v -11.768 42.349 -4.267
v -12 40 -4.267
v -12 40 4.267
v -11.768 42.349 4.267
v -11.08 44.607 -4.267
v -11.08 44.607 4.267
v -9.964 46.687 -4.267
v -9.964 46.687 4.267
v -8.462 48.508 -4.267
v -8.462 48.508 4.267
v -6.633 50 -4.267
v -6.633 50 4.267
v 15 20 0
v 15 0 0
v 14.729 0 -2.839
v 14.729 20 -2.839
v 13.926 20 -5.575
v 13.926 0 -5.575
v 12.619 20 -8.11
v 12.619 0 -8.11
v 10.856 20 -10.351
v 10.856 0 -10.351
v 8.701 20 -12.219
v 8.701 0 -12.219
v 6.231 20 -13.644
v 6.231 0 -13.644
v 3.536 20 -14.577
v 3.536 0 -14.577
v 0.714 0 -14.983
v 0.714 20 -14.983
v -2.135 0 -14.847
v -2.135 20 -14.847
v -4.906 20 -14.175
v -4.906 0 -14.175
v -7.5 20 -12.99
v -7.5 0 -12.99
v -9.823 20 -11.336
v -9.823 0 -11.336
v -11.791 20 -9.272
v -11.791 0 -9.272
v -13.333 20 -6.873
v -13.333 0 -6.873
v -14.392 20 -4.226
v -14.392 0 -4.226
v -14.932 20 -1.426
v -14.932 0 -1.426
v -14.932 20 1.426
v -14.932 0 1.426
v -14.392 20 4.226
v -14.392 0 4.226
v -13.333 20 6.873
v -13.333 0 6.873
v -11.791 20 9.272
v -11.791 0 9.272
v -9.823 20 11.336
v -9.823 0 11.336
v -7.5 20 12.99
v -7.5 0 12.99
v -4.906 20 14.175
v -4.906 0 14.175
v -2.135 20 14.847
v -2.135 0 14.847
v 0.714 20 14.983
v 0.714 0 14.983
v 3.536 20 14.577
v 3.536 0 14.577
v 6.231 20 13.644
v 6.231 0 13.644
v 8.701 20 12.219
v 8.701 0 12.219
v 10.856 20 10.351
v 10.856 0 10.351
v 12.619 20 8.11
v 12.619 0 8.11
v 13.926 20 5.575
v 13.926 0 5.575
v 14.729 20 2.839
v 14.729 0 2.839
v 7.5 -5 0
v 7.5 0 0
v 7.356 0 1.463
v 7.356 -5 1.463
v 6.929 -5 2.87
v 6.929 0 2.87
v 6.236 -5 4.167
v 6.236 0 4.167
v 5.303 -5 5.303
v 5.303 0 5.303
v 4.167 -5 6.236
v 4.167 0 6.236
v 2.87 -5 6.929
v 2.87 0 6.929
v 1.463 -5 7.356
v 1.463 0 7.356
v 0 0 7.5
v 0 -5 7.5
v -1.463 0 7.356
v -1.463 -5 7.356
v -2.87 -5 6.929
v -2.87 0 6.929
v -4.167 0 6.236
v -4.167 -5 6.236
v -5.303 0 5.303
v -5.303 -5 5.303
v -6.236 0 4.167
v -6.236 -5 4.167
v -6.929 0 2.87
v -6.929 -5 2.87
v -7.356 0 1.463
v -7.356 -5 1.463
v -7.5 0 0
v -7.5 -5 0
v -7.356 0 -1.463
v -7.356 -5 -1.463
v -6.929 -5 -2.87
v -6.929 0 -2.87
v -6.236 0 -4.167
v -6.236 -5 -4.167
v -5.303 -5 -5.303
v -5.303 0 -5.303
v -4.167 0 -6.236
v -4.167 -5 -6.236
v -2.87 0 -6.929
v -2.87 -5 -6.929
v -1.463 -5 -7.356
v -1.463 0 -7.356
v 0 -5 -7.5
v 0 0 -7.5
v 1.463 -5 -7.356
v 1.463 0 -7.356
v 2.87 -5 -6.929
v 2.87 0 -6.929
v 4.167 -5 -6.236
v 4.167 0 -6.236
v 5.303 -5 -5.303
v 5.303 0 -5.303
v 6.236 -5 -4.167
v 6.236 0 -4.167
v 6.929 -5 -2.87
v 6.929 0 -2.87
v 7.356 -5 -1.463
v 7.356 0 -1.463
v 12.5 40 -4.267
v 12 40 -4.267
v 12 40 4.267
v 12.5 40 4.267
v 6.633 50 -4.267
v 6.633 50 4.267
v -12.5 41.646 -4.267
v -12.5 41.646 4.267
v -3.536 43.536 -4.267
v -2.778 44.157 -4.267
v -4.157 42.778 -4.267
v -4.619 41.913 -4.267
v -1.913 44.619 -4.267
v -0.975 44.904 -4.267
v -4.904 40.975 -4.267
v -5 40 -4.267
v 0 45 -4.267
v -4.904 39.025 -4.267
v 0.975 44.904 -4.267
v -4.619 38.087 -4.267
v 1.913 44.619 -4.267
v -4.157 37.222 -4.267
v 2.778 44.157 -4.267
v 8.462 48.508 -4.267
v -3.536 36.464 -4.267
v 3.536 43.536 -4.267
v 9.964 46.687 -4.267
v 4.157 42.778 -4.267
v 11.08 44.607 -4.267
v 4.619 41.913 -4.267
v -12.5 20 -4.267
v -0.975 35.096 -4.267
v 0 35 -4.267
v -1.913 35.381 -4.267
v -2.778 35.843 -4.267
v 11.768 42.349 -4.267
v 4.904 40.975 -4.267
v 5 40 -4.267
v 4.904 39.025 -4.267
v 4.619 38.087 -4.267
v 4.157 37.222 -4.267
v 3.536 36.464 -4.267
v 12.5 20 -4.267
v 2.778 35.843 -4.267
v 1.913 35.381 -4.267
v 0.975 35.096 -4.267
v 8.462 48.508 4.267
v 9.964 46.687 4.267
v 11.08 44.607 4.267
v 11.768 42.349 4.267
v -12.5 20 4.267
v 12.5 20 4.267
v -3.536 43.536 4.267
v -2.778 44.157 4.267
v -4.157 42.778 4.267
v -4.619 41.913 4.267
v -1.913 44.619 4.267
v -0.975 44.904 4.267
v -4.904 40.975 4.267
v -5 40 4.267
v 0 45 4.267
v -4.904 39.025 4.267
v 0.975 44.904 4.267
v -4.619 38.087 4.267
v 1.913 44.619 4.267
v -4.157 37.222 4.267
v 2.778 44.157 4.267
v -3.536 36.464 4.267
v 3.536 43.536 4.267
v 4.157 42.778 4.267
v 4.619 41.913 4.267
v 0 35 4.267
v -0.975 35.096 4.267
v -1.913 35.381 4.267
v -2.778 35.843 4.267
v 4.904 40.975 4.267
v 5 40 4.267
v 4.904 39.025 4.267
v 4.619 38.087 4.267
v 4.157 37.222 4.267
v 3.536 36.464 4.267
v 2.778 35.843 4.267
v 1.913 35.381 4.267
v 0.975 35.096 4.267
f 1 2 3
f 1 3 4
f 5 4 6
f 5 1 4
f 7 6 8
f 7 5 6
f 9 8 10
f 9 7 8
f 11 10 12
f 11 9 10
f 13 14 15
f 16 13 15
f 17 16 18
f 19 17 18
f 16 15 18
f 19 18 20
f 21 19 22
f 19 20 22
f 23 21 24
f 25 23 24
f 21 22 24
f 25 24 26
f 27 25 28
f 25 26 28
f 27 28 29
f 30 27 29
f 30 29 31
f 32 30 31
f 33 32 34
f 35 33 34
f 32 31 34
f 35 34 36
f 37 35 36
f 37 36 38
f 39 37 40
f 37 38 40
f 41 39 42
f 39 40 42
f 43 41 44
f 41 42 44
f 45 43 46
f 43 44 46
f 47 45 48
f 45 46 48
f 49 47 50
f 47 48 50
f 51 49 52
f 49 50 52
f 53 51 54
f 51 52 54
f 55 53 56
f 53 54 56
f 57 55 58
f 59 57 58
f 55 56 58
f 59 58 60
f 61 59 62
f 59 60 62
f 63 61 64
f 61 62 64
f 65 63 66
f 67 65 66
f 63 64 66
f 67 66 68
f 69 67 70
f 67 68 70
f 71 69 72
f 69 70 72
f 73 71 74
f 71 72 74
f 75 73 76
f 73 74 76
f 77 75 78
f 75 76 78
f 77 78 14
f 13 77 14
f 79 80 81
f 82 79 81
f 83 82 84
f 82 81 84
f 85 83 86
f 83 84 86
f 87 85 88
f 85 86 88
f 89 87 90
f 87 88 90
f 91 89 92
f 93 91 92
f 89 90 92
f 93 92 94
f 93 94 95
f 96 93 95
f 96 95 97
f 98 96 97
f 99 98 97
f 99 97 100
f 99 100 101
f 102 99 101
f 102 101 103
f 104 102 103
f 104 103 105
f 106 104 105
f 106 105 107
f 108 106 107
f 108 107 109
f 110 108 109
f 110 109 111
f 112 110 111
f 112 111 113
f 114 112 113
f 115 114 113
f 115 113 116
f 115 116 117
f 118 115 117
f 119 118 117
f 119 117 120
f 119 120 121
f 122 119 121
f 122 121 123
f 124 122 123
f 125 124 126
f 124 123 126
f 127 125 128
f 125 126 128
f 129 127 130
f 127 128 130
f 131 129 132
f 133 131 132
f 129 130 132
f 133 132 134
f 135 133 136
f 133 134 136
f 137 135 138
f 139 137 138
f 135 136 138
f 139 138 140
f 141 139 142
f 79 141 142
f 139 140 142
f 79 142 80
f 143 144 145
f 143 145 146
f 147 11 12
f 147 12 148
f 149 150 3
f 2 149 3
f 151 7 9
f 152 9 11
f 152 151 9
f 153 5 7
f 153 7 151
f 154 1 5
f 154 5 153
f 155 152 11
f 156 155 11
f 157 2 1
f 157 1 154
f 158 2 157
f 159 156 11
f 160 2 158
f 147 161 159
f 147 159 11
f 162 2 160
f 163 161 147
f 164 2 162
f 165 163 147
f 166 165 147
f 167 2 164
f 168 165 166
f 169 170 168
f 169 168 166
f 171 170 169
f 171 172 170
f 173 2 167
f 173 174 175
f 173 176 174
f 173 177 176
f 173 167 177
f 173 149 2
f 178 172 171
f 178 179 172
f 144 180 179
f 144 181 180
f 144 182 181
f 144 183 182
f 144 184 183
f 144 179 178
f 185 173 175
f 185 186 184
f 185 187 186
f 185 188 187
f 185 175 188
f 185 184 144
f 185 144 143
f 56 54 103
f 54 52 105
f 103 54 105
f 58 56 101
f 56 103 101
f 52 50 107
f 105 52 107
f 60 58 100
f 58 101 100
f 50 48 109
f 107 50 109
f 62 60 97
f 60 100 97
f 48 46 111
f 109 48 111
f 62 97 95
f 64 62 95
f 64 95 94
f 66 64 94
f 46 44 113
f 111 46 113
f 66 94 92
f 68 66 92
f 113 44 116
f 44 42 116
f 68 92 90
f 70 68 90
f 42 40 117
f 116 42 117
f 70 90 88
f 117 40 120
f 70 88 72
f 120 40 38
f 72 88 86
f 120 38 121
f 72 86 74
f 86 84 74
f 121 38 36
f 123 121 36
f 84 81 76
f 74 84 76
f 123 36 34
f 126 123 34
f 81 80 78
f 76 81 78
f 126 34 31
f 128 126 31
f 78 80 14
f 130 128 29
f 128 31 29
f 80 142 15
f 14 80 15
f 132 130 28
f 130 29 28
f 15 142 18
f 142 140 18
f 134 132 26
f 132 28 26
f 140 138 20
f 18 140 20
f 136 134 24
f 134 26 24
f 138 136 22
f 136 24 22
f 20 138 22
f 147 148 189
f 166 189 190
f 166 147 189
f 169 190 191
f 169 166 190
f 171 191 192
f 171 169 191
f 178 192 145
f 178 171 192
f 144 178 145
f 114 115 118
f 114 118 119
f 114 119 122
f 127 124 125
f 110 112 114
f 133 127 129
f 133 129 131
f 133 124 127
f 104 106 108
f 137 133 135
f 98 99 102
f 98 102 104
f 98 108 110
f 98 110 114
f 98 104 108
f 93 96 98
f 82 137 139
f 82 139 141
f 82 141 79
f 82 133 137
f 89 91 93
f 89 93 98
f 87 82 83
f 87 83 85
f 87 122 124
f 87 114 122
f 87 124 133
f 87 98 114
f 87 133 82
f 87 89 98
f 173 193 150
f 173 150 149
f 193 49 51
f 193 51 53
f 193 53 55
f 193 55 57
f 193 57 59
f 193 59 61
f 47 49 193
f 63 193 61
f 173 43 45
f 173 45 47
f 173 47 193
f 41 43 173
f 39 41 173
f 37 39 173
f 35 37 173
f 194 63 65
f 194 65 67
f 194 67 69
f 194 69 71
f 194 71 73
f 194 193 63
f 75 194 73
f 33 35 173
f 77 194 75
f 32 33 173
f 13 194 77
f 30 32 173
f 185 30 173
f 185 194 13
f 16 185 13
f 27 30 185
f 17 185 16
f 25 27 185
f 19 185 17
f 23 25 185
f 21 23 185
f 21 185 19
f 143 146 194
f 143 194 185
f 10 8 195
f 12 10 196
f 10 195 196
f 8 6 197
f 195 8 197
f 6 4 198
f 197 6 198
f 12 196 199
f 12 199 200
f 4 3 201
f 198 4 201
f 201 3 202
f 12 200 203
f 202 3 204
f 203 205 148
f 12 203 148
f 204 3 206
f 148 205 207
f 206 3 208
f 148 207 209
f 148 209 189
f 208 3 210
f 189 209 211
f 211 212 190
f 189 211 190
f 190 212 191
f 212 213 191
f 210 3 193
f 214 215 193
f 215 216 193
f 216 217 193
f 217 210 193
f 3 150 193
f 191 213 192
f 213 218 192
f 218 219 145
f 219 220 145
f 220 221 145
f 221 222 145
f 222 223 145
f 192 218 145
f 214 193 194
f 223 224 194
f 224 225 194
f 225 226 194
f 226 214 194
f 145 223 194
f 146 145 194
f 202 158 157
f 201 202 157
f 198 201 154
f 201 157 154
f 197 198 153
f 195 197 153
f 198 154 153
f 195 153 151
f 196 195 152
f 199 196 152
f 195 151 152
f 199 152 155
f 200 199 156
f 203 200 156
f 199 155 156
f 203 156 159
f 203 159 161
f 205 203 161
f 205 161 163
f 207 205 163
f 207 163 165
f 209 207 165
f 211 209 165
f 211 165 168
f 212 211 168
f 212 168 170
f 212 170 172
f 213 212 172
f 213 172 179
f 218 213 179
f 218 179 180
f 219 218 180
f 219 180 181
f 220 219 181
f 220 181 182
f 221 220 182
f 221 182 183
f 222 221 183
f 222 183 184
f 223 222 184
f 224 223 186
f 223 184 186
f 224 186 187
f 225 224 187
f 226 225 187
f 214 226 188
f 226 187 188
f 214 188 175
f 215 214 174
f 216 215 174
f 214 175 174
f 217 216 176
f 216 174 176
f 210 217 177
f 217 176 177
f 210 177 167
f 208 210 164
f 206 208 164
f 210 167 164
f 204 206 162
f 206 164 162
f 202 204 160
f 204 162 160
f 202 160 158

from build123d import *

# Parameters (mm, degrees)
SKETCH1_R           = 15
BOSS_EXTRUDE1_DEPTH = 20
SKETCH2_R           = 7.5
CUT_EXTRUDE1_DEPTH  = 10
SKETCH3_W           = 25
SKETCH3_H           = 8.533910502
BOSS_EXTRUDE2_DEPTH = 30
SKETCH4_R           = 5
CUT_EXTRUDE2_DEPTH  = 30
SKETCH5_R           = 7.5
BOSS_EXTRUDE3_DEPTH = 15


with BuildPart() as part:
    # Sketch1 → Boss-Extrude1 (new body)
    with BuildSketch(Plane(origin=(0, 0, 0), x_dir=(1, 0, 0), z_dir=(0, 1, 0))):
        Circle(SKETCH1_R)
    extrude(amount=BOSS_EXTRUDE1_DEPTH)

    # Sketch2 → Cut-Extrude1 (cut)
    with BuildSketch(Plane.XZ):
        Circle(SKETCH2_R)
    extrude(amount=-CUT_EXTRUDE1_DEPTH, mode=Mode.SUBTRACT)

    # Sketch3 → Boss-Extrude2 (add)
    with BuildSketch(Plane(origin=(0, 20, 0), x_dir=(1, 0, 0), z_dir=(0, 1, 0))):
        Rectangle(SKETCH3_W, SKETCH3_H)
    extrude(amount=BOSS_EXTRUDE2_DEPTH)

    # Sketch4 → Cut-Extrude2 (cut)
    with BuildSketch(Plane(origin=(0, 0, -4.266955251), x_dir=(-1, 0, 0), z_dir=(0, 0, -1))):
        with Locations((0, 40)):
            Circle(SKETCH4_R)
        with BuildLine():
            Line((12, 112.846805037), (20.699554593, 68.640446889))
            Line((20.699554593, 68.640446889), (12, 40))
            ThreePointArc((12, 40), (0, 52), (-12, 40))
            Line((-12, 40), (-18.346894815, 40))
            Line((-18.346894815, 40), (-15.704364739, 112.846805037))
            Line((-15.704364739, 112.846805037), (12, 112.846805037))
        make_face()
    extrude(amount=-CUT_EXTRUDE2_DEPTH, mode=Mode.SUBTRACT)

    # Sketch5 → Boss-Extrude3 (add)
    with BuildSketch(Plane.XZ.offset(-10)):
        Circle(SKETCH5_R)
    extrude(amount=BOSS_EXTRUDE3_DEPTH)


solid = part.part
